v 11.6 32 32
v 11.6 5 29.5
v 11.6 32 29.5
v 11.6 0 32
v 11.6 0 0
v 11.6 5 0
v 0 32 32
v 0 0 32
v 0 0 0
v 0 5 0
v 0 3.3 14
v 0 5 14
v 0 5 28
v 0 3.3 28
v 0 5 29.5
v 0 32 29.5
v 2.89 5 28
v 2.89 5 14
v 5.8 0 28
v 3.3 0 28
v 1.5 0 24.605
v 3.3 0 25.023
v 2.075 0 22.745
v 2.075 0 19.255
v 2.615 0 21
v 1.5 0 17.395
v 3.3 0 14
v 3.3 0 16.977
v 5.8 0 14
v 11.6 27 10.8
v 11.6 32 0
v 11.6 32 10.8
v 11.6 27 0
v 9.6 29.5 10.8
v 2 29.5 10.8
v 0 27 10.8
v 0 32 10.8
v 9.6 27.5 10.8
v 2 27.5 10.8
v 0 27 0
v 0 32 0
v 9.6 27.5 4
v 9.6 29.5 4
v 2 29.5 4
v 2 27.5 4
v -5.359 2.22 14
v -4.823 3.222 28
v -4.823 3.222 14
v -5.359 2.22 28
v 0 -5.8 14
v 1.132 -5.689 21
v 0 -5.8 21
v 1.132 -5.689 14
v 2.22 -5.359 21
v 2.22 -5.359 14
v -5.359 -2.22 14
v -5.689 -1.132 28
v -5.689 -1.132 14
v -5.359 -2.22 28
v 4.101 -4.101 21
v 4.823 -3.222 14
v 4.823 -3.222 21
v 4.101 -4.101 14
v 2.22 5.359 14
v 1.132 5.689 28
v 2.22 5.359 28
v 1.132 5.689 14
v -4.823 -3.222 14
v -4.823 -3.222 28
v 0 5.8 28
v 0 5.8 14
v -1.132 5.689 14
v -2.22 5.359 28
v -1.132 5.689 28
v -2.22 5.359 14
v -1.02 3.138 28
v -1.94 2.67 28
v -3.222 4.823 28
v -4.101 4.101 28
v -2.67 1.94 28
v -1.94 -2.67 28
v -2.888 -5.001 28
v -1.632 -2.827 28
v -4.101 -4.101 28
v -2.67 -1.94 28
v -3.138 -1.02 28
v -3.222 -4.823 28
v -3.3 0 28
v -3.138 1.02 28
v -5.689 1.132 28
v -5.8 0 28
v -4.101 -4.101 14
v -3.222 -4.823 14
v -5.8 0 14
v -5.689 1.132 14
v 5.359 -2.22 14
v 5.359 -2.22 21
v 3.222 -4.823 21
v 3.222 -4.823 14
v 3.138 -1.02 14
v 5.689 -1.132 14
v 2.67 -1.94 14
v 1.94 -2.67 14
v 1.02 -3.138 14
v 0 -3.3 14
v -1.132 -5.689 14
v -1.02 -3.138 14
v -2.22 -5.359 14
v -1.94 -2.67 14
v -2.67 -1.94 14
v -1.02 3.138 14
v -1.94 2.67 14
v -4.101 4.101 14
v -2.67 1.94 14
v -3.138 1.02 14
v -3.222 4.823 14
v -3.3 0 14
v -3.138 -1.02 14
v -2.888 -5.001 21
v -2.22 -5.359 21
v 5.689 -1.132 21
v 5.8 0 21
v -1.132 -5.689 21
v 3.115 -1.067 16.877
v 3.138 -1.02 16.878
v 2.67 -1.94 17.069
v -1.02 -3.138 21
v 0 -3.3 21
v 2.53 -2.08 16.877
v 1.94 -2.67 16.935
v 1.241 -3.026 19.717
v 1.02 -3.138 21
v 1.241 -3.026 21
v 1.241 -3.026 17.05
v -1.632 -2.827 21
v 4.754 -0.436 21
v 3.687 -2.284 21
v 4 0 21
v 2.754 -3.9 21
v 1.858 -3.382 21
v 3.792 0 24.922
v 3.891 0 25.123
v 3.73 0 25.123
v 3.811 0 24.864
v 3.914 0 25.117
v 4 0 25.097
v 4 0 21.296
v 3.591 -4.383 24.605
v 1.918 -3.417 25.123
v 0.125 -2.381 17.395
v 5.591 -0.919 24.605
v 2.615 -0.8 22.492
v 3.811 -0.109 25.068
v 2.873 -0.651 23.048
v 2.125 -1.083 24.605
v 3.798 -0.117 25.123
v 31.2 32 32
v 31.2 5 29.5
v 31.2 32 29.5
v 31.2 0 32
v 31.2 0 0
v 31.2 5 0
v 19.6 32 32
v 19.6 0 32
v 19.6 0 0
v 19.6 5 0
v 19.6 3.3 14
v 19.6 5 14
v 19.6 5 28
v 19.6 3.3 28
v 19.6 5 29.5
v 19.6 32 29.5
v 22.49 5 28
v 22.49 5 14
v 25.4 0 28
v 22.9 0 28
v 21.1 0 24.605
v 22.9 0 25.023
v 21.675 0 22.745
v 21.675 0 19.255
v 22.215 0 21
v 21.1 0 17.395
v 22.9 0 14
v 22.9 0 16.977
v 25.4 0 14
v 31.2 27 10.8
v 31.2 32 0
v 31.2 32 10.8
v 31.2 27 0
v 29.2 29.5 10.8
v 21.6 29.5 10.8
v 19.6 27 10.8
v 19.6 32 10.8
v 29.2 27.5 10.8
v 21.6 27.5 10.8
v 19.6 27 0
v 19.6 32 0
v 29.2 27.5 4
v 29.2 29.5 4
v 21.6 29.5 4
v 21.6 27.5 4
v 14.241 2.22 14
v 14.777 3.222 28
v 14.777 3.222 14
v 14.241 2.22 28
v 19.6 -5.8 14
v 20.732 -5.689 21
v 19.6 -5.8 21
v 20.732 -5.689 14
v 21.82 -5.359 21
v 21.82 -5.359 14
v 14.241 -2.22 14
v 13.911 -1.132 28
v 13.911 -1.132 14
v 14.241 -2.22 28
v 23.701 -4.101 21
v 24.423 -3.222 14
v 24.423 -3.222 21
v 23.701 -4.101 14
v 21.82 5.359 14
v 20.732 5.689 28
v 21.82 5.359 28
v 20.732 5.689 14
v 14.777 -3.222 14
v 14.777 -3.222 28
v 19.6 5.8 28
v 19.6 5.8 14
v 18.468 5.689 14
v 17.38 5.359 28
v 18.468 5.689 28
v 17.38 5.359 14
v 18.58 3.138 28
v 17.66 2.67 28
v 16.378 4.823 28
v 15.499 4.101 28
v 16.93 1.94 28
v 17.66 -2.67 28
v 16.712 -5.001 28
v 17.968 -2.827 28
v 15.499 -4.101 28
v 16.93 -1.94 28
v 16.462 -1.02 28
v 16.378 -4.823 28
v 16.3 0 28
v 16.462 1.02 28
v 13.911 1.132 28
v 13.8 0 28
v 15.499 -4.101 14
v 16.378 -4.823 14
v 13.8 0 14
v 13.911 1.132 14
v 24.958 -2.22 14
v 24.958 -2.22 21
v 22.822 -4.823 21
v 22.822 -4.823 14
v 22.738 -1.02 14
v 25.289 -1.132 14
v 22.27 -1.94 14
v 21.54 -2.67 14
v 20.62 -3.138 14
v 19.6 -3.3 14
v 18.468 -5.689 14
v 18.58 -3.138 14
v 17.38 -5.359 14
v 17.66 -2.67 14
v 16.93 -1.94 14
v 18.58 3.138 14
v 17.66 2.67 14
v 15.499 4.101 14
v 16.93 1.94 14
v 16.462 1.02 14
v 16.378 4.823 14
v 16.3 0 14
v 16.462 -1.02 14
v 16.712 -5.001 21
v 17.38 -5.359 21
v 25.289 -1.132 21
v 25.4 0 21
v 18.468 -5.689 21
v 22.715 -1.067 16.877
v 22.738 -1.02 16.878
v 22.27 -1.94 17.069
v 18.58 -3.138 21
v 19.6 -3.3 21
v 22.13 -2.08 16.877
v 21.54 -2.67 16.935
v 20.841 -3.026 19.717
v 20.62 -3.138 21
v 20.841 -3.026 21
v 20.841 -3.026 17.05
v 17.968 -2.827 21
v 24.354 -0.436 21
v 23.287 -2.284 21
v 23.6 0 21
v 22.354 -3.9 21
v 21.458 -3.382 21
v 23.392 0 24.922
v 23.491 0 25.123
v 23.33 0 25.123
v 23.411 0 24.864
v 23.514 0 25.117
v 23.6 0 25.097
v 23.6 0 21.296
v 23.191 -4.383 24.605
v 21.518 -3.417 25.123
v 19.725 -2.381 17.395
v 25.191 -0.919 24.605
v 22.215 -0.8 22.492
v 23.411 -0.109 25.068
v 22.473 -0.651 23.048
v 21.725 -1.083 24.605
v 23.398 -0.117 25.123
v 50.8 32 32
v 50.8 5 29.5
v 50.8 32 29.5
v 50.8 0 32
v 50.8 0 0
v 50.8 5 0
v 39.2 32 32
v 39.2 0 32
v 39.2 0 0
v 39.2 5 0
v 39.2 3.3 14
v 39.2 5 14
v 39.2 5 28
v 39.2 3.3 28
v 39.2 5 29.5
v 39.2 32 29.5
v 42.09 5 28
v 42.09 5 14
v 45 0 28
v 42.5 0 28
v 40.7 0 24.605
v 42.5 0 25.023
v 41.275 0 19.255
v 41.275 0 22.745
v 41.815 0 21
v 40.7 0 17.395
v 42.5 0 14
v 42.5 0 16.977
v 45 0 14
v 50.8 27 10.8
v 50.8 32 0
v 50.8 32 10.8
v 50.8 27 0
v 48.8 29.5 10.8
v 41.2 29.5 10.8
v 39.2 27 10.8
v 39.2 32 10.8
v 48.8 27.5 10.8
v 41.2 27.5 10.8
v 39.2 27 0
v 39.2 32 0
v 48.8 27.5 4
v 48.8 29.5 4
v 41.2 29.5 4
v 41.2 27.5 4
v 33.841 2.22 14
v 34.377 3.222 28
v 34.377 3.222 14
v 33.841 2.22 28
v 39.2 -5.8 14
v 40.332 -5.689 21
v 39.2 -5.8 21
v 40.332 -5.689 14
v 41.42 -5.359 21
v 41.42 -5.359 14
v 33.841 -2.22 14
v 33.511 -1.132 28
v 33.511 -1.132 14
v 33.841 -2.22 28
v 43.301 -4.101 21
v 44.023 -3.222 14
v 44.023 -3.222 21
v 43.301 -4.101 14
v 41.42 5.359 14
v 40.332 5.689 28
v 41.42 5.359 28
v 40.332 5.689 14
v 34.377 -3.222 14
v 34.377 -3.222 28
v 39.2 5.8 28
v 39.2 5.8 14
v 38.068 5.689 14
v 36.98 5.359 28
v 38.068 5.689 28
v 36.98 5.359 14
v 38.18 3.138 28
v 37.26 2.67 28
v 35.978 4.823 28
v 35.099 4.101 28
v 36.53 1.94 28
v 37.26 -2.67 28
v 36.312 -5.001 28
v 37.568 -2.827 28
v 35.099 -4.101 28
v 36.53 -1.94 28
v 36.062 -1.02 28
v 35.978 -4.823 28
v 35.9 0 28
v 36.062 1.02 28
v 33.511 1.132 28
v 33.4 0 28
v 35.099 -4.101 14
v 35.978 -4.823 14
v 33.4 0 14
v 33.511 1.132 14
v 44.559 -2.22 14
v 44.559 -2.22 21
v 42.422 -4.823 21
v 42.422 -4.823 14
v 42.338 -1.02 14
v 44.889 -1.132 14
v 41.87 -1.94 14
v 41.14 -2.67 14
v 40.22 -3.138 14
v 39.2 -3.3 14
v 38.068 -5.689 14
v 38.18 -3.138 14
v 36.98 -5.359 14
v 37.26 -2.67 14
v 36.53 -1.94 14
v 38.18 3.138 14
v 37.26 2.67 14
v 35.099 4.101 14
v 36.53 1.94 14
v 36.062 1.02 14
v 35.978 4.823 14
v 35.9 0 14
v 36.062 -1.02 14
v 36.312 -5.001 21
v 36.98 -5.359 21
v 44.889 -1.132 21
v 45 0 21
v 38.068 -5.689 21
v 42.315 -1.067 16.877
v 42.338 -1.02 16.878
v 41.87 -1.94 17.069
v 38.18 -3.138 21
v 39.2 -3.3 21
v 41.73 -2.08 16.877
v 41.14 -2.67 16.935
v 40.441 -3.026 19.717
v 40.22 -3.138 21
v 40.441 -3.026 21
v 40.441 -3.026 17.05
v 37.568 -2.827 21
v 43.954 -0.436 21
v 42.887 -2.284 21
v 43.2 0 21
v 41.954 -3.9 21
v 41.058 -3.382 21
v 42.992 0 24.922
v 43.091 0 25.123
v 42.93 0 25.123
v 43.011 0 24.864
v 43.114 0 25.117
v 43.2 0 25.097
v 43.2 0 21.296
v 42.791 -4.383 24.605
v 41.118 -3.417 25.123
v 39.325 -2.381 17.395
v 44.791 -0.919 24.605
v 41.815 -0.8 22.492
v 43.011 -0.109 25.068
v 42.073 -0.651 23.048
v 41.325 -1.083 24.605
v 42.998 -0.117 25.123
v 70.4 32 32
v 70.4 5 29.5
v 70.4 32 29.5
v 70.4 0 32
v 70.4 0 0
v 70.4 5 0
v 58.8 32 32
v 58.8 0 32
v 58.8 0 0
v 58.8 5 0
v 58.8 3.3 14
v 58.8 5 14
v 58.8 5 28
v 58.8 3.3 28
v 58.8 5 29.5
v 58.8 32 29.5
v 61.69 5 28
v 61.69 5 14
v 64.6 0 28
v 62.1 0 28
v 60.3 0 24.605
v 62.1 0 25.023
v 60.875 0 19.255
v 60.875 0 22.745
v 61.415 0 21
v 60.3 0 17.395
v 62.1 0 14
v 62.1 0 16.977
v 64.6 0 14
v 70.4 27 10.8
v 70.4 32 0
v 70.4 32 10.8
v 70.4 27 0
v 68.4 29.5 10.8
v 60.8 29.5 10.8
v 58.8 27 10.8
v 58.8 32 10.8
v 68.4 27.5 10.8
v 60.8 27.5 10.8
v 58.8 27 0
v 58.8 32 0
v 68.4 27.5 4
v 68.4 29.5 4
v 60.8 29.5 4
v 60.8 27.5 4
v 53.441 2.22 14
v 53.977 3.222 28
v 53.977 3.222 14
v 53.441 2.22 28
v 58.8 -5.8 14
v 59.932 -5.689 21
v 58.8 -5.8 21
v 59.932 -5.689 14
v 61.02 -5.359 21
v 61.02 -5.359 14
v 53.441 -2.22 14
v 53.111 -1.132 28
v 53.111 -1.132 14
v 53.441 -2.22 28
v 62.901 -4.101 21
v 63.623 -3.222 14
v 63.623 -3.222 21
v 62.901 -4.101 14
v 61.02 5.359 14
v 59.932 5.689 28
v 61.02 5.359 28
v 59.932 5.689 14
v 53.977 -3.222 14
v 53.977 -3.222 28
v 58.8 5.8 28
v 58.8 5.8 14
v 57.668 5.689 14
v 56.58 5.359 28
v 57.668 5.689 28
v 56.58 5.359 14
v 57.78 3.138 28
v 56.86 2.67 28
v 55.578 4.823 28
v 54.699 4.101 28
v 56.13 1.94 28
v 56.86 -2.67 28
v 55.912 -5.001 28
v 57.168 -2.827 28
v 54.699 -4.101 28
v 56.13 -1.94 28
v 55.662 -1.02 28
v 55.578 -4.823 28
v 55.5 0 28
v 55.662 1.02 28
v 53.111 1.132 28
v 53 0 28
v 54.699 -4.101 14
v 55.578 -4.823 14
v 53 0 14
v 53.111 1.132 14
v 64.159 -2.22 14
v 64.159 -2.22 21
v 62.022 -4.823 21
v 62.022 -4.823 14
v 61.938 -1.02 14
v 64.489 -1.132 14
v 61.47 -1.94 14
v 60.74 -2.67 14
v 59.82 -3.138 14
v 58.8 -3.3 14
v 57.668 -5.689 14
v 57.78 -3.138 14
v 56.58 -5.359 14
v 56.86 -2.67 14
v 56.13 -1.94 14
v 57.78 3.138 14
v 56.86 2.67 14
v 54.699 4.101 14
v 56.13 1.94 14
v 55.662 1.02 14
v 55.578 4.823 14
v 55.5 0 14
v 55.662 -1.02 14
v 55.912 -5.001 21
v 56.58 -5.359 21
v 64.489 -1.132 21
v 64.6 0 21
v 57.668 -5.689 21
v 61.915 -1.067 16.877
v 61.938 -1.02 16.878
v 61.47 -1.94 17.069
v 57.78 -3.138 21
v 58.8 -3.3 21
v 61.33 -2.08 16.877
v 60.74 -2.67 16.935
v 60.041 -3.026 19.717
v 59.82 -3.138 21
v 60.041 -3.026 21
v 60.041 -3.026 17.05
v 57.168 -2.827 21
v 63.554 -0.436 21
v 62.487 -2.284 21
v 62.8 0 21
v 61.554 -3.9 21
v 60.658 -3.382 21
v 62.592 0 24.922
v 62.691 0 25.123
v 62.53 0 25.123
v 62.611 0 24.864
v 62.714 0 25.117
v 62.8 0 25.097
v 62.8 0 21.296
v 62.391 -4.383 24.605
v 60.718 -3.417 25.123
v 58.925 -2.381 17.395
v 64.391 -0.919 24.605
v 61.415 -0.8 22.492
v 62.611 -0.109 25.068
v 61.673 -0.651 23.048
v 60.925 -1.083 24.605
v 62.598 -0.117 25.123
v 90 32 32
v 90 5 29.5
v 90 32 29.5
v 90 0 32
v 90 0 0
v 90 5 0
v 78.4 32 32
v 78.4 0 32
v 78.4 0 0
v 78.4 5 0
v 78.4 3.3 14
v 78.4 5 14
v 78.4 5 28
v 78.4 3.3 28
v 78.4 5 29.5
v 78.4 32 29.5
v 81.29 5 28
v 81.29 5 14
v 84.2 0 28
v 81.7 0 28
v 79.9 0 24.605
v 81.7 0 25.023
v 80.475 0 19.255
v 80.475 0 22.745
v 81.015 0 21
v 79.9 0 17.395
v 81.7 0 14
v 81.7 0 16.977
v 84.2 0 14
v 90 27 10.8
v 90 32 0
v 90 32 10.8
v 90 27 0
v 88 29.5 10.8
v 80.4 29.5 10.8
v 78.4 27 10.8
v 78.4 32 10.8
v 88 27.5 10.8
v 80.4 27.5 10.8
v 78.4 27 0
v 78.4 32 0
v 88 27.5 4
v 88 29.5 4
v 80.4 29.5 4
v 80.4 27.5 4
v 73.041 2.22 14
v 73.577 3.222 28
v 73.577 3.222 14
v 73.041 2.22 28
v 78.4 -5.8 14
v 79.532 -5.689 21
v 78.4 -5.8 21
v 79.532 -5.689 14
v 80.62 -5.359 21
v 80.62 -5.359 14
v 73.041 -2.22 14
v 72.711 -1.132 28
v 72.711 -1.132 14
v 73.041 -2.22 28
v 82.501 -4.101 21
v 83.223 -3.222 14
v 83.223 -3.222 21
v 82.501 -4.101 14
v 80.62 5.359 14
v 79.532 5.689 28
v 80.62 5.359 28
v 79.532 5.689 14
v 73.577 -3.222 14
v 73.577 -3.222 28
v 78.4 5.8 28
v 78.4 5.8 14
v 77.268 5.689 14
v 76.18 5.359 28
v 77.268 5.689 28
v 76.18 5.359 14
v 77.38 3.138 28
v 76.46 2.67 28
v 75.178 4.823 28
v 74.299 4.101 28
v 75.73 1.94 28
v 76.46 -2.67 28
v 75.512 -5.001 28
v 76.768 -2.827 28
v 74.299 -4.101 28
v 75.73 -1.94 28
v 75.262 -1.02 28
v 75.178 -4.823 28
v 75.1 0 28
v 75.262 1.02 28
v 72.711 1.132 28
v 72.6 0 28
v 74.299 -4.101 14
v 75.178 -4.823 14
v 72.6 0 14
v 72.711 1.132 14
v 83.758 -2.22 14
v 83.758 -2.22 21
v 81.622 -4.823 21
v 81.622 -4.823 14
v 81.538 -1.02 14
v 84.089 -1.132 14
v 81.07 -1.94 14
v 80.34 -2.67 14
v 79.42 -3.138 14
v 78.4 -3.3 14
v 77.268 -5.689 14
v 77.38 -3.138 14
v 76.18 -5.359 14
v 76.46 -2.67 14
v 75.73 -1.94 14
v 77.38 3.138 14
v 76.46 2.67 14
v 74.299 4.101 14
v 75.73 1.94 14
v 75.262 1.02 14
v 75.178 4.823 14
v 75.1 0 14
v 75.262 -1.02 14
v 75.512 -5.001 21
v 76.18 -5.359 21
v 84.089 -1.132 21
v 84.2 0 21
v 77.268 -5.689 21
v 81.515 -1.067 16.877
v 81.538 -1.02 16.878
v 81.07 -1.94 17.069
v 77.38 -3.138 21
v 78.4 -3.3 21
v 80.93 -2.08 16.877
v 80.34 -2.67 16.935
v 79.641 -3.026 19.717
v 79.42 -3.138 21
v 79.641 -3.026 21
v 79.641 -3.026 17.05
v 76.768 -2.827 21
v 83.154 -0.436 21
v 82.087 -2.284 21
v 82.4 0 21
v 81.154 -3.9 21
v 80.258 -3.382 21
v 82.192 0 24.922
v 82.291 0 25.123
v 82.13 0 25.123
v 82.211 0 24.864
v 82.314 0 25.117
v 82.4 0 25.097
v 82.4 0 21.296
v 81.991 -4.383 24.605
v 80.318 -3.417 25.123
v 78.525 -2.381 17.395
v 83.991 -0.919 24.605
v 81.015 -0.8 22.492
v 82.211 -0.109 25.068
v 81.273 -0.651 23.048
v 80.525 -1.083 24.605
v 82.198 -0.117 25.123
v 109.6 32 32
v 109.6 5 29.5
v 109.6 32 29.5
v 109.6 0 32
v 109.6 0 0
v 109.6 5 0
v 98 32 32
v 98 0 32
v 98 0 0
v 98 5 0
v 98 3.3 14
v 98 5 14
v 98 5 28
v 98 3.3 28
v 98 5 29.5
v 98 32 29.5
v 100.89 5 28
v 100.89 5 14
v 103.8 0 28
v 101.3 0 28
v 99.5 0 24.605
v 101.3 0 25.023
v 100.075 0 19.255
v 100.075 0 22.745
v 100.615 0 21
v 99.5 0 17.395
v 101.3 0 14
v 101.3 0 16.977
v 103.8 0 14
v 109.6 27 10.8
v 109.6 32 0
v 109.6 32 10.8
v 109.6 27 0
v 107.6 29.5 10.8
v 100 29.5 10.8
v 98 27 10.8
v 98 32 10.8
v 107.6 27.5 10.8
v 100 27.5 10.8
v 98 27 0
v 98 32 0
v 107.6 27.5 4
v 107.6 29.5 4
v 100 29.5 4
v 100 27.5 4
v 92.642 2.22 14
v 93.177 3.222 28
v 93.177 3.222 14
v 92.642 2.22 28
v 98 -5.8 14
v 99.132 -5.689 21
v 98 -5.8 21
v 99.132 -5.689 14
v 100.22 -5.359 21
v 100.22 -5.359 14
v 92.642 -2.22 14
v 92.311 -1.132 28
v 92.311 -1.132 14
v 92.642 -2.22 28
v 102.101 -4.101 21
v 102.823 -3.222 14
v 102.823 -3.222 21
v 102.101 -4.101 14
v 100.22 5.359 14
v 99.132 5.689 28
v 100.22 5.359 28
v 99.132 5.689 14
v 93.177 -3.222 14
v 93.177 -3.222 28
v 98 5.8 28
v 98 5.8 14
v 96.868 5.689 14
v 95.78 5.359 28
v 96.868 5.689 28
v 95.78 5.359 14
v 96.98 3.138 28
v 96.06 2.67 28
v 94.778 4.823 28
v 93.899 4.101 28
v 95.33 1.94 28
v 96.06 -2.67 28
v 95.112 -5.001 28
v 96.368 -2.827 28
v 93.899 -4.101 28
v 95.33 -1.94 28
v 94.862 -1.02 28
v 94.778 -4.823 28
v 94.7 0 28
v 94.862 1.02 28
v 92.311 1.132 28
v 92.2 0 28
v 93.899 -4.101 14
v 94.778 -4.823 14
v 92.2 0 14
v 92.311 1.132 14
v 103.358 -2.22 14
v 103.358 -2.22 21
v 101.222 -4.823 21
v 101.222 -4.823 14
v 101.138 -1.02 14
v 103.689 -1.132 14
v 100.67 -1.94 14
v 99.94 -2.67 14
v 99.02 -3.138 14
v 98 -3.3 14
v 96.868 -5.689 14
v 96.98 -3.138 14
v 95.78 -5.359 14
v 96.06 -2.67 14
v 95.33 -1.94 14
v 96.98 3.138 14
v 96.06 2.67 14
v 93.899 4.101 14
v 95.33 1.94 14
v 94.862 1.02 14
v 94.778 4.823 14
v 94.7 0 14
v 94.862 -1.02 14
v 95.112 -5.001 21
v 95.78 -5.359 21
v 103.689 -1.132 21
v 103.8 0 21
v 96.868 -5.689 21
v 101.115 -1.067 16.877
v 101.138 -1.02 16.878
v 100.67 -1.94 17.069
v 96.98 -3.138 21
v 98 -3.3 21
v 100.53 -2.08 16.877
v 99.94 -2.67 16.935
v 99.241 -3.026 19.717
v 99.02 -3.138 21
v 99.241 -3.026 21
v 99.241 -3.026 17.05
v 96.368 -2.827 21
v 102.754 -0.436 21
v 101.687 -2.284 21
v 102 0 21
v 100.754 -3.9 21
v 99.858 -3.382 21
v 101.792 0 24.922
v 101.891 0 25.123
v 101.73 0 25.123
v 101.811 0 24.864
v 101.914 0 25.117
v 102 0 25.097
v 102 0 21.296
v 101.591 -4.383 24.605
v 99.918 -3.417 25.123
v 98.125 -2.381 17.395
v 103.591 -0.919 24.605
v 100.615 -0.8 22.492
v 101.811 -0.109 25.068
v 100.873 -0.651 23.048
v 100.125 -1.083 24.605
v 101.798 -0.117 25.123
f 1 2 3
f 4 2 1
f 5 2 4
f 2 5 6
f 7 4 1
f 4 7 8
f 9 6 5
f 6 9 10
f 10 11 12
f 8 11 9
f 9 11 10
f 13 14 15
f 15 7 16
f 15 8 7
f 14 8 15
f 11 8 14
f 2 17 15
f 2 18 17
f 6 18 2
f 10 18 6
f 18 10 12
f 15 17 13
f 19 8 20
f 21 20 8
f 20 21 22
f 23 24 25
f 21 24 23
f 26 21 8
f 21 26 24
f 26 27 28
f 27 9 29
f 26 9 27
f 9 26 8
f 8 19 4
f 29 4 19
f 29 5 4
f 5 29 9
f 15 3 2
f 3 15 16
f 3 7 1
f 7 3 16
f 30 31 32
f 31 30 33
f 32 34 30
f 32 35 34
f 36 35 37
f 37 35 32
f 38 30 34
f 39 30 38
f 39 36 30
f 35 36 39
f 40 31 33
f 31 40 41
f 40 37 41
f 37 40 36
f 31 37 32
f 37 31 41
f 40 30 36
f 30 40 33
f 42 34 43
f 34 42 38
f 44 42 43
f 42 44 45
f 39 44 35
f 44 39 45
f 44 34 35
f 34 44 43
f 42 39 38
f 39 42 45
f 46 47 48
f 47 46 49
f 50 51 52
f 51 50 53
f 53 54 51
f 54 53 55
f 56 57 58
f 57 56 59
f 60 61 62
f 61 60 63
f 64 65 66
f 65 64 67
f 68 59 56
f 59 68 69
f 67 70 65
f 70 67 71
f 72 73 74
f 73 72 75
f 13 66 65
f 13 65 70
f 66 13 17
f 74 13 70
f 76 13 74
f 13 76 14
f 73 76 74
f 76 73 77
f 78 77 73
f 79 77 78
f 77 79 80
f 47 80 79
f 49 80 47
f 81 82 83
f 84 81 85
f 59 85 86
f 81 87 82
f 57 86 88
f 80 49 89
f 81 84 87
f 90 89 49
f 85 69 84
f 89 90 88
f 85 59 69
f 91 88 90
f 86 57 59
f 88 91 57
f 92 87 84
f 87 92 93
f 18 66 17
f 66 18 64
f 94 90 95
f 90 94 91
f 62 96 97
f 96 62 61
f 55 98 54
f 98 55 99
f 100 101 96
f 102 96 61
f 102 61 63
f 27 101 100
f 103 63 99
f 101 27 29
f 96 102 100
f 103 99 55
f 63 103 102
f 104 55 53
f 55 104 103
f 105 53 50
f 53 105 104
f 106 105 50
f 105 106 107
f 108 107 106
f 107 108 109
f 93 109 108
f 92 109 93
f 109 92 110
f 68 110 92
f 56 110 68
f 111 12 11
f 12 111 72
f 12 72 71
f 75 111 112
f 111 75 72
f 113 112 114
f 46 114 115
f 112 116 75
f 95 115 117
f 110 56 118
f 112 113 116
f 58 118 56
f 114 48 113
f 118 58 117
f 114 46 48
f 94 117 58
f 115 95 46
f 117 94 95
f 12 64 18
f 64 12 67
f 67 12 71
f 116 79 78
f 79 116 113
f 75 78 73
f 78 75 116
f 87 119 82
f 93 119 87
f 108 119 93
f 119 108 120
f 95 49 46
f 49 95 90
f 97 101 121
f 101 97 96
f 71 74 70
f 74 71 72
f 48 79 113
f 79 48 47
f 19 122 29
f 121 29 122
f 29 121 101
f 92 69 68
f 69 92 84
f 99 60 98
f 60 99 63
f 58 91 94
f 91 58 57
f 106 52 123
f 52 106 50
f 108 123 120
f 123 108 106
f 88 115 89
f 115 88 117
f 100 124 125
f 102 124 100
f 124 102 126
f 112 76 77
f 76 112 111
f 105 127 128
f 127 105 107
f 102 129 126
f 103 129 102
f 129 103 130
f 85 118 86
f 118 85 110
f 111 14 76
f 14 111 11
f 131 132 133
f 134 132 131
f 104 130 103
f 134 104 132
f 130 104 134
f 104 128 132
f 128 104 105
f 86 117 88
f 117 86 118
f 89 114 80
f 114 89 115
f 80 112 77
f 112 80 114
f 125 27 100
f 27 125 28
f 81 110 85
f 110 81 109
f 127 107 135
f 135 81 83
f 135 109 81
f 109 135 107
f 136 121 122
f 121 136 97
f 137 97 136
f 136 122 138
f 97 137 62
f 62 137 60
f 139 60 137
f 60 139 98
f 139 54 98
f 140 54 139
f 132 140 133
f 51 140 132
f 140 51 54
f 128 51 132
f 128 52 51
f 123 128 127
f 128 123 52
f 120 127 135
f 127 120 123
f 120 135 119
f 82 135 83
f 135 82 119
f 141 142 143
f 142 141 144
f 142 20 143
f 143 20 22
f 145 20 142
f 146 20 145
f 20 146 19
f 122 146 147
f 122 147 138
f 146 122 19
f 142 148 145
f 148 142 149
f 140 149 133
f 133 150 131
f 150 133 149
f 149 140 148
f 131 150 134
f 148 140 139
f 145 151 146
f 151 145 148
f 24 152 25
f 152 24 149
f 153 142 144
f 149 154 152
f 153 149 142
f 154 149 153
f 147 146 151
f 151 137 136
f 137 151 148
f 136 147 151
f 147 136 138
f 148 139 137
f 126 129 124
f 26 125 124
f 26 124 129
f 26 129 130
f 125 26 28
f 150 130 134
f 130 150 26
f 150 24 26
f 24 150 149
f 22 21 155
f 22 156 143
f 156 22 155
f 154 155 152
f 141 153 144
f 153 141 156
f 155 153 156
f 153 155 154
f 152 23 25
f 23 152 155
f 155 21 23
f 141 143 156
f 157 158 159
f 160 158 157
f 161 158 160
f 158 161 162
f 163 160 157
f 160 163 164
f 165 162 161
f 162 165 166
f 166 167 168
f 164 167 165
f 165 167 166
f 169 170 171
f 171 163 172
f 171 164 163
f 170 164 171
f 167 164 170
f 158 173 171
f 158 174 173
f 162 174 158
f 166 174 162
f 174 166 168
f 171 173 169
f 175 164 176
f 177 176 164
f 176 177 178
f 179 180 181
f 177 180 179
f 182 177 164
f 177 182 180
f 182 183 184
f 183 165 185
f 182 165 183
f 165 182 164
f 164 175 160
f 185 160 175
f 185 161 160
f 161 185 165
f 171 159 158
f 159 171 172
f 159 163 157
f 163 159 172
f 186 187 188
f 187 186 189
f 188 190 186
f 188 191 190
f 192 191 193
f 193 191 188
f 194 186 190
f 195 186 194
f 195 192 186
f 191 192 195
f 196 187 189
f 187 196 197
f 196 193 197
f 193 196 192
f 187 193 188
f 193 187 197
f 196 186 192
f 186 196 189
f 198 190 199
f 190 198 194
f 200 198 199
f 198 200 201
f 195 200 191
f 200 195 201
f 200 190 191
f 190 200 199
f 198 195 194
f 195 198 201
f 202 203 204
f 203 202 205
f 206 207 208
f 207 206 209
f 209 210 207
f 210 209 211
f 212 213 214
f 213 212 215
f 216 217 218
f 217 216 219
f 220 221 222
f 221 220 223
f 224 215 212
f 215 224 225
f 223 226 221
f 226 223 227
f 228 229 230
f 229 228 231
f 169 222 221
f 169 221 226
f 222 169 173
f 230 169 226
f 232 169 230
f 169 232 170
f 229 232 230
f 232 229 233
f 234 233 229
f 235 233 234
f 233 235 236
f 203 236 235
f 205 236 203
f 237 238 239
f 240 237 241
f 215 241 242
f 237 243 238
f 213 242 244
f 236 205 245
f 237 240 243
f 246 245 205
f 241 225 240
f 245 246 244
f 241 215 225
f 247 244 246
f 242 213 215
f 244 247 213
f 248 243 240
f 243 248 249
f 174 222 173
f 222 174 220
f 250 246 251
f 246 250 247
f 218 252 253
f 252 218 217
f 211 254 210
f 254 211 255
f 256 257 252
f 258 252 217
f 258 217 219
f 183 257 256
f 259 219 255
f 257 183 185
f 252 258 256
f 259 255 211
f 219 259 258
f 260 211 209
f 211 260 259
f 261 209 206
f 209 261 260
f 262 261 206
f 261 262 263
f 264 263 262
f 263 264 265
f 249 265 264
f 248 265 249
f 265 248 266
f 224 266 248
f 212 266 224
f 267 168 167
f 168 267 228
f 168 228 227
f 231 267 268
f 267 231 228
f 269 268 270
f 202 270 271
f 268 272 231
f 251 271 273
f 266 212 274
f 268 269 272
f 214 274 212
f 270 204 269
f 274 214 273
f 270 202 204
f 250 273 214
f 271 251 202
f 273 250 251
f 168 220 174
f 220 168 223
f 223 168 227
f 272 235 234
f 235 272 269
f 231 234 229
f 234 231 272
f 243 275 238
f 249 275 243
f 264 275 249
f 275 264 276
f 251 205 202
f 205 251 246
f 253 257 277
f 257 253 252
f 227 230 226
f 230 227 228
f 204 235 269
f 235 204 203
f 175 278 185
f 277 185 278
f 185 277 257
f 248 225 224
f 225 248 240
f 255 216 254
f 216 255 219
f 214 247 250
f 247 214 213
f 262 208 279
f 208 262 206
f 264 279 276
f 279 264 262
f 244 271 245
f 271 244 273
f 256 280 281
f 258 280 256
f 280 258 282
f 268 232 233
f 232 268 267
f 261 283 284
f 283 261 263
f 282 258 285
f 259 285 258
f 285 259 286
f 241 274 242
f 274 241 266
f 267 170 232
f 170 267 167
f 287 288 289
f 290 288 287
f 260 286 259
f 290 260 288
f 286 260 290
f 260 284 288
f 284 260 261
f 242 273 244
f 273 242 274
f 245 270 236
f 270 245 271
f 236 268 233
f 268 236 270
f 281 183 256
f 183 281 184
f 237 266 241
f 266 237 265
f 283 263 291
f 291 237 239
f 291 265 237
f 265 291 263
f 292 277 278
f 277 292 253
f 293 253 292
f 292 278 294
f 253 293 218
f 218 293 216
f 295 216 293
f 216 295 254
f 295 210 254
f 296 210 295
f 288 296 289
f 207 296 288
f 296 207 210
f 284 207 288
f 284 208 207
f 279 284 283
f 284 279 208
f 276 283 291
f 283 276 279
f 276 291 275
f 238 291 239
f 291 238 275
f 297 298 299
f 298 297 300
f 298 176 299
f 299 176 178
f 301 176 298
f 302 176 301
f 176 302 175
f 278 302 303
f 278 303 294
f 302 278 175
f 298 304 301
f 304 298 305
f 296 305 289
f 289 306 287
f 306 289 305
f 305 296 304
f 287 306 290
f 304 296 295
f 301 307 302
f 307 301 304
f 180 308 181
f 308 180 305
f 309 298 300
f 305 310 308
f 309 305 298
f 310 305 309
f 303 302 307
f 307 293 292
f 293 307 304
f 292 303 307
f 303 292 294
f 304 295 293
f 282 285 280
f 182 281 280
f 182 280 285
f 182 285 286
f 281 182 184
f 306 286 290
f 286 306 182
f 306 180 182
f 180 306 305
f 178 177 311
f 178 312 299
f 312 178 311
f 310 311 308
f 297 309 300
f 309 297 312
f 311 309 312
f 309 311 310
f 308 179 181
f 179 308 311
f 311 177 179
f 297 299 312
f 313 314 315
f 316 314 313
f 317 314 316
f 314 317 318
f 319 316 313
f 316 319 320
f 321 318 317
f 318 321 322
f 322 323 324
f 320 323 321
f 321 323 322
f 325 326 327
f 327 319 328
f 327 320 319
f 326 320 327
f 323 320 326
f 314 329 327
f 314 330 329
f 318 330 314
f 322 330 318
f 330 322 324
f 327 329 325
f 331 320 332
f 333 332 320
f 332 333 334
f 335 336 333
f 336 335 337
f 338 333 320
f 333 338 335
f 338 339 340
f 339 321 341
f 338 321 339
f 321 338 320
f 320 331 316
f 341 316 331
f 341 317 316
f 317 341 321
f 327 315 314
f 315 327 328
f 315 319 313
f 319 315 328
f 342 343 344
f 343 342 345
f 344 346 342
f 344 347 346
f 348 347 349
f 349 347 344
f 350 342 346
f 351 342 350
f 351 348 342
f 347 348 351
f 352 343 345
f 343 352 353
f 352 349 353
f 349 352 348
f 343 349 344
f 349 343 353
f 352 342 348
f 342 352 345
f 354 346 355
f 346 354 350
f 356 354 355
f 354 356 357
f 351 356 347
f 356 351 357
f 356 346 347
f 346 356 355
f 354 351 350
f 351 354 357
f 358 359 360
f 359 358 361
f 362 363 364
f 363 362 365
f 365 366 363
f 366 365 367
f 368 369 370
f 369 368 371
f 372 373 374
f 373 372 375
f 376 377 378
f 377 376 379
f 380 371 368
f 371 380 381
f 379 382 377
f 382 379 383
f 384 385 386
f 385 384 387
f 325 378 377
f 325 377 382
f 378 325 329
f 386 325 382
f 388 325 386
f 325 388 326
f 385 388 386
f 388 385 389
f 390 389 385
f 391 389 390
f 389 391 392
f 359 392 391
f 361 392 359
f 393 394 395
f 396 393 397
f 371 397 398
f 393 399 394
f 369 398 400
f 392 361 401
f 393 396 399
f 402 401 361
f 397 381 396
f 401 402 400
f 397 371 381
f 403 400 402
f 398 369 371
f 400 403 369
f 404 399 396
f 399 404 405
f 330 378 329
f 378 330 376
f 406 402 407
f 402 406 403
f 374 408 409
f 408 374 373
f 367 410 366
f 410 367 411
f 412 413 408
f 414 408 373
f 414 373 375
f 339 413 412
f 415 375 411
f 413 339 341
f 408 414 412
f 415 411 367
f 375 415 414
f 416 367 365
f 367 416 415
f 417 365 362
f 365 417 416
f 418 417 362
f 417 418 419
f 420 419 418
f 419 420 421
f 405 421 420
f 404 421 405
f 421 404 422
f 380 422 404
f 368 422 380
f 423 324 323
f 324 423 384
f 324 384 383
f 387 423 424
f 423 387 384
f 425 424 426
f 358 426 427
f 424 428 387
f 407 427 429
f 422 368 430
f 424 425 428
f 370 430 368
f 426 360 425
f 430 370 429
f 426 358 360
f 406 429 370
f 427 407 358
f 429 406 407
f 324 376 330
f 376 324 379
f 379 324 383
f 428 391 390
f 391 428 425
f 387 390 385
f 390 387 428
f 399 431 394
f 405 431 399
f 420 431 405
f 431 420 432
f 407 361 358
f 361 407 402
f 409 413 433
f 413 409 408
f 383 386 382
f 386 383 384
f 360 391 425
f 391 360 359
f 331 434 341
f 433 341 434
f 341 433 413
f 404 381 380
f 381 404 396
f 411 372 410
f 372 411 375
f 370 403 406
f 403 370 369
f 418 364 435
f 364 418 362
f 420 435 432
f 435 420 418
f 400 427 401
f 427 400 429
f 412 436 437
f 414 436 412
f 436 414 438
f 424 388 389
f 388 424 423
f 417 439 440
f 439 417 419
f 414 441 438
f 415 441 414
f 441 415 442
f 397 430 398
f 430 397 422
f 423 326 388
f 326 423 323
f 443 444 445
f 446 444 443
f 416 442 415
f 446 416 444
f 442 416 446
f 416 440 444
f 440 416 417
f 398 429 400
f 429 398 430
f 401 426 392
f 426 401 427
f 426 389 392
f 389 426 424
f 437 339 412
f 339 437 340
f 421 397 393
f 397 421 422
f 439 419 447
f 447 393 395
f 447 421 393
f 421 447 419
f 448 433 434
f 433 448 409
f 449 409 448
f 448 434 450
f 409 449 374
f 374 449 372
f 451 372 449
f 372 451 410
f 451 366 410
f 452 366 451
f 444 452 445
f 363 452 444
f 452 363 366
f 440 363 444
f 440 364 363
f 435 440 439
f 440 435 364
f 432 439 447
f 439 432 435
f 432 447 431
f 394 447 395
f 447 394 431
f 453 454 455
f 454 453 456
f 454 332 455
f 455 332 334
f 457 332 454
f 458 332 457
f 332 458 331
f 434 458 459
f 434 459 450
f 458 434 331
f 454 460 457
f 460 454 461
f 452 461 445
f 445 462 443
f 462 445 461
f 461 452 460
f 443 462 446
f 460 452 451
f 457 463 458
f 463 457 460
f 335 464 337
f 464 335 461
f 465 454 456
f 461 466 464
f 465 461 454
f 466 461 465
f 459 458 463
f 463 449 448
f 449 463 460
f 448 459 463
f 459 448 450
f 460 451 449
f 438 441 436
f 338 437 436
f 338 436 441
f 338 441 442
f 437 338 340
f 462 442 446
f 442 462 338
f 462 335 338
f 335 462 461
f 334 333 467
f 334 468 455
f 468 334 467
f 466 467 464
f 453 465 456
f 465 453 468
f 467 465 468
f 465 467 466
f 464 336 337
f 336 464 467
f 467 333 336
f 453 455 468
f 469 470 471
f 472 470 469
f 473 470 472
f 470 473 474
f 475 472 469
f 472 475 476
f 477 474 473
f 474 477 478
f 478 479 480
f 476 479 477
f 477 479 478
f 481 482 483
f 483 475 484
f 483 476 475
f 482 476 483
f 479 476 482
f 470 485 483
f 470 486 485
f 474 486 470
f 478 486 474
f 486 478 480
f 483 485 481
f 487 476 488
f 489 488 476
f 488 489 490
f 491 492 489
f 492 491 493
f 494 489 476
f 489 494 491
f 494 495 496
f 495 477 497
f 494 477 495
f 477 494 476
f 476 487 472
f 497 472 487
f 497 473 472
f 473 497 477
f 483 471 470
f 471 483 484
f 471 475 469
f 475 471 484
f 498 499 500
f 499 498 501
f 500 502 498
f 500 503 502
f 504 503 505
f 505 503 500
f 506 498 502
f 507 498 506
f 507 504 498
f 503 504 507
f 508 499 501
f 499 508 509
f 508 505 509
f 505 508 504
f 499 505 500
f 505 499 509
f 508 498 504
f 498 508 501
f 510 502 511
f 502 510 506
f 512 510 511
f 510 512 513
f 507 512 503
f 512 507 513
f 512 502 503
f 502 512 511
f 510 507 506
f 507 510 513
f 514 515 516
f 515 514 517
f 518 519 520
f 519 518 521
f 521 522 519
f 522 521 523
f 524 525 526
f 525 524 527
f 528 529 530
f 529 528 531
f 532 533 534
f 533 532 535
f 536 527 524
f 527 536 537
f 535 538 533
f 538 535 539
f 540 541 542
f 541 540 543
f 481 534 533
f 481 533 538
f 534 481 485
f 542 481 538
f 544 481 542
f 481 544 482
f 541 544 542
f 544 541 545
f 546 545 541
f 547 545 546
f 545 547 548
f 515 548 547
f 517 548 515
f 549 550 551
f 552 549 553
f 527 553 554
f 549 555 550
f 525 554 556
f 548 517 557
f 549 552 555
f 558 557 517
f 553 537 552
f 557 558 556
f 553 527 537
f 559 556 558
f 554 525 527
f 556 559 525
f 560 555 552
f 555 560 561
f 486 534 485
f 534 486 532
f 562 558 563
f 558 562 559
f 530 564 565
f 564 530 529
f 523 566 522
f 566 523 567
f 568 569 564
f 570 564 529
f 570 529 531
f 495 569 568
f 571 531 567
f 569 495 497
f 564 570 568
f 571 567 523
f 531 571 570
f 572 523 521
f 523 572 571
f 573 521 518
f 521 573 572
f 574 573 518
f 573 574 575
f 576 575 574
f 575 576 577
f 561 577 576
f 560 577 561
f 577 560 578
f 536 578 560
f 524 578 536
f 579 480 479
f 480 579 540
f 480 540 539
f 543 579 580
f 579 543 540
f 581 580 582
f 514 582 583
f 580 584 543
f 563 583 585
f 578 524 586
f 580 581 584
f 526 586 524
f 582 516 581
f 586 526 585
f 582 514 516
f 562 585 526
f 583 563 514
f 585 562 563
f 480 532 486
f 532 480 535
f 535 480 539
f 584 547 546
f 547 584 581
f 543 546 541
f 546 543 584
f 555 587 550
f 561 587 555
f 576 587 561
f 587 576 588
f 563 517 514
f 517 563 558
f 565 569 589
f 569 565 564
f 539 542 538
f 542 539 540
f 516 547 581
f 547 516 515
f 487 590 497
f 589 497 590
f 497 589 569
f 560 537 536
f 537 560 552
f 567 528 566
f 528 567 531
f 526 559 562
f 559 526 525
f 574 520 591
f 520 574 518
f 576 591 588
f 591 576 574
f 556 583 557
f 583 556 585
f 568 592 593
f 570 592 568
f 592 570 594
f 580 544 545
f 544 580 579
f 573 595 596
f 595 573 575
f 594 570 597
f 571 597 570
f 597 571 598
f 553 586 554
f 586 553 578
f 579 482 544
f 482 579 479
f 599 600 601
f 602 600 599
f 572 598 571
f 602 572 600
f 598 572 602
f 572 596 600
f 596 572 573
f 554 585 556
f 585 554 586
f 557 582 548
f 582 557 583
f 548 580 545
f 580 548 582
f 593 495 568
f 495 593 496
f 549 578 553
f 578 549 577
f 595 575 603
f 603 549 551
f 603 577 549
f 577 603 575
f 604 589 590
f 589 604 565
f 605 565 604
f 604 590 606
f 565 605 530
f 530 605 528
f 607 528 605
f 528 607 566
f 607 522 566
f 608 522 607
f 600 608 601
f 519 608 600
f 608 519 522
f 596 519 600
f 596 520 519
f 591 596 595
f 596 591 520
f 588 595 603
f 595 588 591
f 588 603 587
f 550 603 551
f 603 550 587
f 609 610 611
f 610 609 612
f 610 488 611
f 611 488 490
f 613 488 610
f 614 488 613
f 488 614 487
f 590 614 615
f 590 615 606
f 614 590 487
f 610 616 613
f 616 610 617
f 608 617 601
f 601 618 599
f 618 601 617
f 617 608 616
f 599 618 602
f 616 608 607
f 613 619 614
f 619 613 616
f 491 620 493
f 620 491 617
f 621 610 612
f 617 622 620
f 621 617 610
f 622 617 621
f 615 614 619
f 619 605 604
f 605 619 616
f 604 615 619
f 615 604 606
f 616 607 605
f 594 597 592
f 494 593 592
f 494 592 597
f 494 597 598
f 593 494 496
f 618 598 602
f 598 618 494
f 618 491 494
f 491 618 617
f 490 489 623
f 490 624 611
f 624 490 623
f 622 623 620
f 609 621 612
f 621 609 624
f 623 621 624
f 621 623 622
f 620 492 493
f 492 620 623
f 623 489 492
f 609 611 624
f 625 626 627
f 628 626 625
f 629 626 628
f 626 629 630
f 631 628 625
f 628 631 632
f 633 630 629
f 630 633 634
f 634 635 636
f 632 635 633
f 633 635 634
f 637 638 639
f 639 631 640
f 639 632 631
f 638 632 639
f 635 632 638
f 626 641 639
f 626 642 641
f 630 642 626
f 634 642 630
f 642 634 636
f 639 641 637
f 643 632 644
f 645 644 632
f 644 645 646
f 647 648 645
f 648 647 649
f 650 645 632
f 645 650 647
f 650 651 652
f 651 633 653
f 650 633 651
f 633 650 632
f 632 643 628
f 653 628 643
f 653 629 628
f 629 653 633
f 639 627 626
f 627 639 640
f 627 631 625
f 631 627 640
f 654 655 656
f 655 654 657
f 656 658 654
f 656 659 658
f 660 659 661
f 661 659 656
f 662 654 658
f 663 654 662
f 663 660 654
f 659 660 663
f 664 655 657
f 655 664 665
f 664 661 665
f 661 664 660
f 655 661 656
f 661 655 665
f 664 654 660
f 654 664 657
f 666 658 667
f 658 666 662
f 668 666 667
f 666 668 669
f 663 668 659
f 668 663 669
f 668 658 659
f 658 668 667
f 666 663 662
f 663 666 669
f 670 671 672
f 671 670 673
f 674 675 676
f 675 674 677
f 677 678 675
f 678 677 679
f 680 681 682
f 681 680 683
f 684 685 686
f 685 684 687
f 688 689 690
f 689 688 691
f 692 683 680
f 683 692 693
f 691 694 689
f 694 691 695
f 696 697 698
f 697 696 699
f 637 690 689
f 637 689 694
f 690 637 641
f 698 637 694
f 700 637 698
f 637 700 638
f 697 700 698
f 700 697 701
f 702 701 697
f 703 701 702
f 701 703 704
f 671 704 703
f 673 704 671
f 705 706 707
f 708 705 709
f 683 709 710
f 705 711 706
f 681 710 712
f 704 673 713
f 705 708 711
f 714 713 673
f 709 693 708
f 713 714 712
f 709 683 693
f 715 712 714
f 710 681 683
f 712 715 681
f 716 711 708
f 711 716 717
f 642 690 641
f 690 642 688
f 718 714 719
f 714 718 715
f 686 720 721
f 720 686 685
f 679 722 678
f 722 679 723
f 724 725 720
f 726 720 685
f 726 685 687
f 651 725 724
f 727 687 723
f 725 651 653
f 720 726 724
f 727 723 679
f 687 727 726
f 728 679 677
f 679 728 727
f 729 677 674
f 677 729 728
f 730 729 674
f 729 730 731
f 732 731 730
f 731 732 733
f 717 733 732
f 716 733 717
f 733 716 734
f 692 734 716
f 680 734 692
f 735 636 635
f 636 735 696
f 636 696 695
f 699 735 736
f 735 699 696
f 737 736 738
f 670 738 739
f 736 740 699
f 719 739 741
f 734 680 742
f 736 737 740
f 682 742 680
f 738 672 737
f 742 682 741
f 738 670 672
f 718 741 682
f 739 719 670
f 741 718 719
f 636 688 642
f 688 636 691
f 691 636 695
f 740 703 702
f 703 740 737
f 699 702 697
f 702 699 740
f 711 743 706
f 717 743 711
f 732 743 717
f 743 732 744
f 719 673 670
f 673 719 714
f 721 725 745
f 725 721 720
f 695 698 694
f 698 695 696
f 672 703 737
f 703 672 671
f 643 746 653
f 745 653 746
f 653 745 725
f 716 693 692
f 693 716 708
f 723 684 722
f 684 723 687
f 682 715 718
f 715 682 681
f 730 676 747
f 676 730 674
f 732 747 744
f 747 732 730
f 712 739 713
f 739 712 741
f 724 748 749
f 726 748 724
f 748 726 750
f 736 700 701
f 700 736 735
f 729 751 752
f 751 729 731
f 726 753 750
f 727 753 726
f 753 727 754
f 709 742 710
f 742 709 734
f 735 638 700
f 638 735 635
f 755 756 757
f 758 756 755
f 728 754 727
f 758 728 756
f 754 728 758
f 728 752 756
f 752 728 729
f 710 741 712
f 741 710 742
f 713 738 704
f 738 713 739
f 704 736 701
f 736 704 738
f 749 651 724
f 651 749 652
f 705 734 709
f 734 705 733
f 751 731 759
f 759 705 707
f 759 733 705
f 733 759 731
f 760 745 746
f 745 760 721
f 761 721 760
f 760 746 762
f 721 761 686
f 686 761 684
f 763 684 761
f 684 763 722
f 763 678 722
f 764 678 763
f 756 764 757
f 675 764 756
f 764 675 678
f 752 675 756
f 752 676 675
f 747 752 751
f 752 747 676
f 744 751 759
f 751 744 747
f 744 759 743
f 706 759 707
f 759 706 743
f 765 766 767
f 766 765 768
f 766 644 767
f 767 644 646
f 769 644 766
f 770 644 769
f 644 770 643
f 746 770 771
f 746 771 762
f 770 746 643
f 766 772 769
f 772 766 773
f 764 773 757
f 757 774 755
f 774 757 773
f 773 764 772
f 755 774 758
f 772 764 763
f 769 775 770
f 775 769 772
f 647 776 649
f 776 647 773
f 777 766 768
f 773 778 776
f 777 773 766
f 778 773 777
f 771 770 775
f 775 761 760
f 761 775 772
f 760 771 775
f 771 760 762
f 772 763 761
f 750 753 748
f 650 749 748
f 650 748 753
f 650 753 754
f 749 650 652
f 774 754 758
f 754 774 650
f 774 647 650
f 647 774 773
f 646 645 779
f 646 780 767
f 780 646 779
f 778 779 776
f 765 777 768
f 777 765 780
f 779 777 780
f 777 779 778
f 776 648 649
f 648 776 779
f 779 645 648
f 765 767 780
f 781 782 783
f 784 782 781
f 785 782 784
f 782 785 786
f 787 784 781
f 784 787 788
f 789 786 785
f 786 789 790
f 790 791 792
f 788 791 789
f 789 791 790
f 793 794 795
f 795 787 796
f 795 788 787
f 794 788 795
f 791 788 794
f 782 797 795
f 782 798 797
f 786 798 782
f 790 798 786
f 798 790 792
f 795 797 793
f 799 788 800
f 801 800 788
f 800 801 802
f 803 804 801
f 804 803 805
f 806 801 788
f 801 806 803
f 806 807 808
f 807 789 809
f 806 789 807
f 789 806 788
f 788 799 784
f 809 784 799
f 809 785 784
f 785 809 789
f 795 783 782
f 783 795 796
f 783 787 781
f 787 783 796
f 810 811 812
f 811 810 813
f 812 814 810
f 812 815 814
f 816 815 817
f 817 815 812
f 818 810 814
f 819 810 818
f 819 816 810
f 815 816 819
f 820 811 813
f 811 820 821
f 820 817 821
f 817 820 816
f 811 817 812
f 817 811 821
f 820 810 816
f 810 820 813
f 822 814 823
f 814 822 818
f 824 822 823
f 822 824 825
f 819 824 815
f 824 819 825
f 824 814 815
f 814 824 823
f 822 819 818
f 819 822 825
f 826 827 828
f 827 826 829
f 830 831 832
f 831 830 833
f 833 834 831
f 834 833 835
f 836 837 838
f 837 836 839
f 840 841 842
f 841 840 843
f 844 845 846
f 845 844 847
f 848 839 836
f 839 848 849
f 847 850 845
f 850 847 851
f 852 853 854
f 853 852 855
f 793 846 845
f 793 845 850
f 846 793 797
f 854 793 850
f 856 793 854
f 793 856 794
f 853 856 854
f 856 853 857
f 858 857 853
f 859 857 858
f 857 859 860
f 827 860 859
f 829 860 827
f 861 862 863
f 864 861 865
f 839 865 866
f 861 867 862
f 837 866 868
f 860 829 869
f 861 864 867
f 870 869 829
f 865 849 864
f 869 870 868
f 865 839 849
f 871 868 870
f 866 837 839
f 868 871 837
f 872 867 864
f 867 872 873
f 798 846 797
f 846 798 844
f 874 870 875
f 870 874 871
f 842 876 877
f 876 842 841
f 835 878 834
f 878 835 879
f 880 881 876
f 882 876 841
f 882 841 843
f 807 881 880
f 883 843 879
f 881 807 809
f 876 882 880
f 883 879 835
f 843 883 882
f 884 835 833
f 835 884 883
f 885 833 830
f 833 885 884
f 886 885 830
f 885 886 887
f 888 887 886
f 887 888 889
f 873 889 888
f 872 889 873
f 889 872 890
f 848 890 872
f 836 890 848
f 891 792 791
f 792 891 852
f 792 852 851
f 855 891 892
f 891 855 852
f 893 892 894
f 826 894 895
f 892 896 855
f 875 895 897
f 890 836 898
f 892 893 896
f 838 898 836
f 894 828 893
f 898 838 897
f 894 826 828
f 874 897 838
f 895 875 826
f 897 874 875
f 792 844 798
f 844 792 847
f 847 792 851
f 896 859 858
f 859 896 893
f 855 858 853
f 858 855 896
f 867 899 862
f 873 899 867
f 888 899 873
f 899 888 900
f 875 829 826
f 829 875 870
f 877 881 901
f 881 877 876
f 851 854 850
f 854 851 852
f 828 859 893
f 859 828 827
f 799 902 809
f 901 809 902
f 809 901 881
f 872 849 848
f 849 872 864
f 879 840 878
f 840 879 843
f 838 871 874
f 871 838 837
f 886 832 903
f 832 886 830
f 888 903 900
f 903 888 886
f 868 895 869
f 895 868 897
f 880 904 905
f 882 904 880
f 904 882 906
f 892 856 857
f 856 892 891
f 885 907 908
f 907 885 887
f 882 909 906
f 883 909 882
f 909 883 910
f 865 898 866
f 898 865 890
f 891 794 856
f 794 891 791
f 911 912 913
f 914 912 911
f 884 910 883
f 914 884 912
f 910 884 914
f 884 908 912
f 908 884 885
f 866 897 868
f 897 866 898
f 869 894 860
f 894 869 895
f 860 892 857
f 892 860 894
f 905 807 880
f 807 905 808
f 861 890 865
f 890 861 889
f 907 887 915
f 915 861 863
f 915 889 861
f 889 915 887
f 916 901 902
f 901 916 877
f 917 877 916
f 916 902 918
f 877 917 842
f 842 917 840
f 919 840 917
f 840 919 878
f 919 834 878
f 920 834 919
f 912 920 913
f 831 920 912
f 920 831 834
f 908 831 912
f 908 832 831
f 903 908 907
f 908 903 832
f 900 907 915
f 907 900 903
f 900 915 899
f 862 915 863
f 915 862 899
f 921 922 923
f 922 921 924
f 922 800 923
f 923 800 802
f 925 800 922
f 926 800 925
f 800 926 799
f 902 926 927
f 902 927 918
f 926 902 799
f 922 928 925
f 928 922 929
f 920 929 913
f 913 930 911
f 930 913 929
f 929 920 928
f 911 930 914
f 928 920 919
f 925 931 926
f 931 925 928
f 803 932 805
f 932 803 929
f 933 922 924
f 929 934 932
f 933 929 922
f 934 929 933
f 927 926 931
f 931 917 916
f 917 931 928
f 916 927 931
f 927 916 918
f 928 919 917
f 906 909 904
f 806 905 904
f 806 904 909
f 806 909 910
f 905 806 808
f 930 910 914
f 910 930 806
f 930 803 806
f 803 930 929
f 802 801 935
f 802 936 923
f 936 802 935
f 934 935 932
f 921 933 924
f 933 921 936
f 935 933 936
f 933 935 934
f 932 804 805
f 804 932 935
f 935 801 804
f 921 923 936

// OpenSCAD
// Cable Clip Set - Desk / Monitor Edge Mount
// PETG — flexible enough to snap on, strong enough to hold
// 0.2mm, 4 walls, 25% infill
// Prints 6 clips per plate — sell as sets

CLIP_TYPE  = "edge";  // "edge" = monitor/desk rim, "flat" = adhesive base

// Cable specs
CABLE_D    = 6;    // Cable diameter (USB-C ≈ 4mm, HDMI ≈ 10mm)
CLIP_PLAY  = 0.6;  // Snap-fit opening extra — PLA needs 0.8, PETG 0.5

// Edge-mount specs
EDGE_T     = 22;   // Desk/monitor edge thickness
EDGE_DEPTH = 18;
WALL_T     = 2.5;

module cable_channel() {
    cylinder(d = CABLE_D + CLIP_PLAY, h = 100, center = true, $fn = 20);
}

module snap_clip_body() {
    union() {
        // Cable cradle
        difference() {
            cylinder(d = CABLE_D + WALL_T*2 + CLIP_PLAY, h = 14, $fn = 32);
            cable_channel();
            // Snap opening (top 120°)
            translate([0, 0, 7])
                rotate([0, 0, -60])
                    linear_extrude(14)
                        polygon([[0,0],
                                 [(CABLE_D+WALL_T*3)*cos(-60), (CABLE_D+WALL_T*3)*sin(-60)],
                                 [(CABLE_D+WALL_T*3)*cos(60),  (CABLE_D+WALL_T*3)*sin(60)]]);
        }
        // Snap fingers
        for (s = [-1, 1])
            rotate([0, 0, s * 30])
                translate([CABLE_D/2 + CLIP_PLAY/2, 0, 7])
                    rotate([0, -15*s, 0])
                        cube([WALL_T * 0.8, 4, 8], center = true);
    }
}

module edge_mount_arm() {
    // Wraps over desk/monitor edge
    difference() {
        union() {
            // Front arm
            cube([CABLE_D + WALL_T*2 + CLIP_PLAY, WALL_T*2, EDGE_DEPTH + 14]);
            // Top bridge
            translate([0, 0, EDGE_DEPTH + 14 - WALL_T])
                cube([CABLE_D + WALL_T*2 + CLIP_PLAY, EDGE_T + WALL_T*4, WALL_T]);
            // Back arm
            translate([0, EDGE_T + WALL_T*2, 0])
                cube([CABLE_D + WALL_T*2 + CLIP_PLAY, WALL_T*2, EDGE_DEPTH * 0.6]);
        }
        // Grip pad slots (for foam tape)
        translate([2, EDGE_T + WALL_T*2 + 0.5, 4])
            cube([CABLE_D + WALL_T*2 + CLIP_PLAY - 4, 2, EDGE_DEPTH * 0.5]);
    }
}

module flat_adhesive_base() {
    cube([CABLE_D + WALL_T*2 + CLIP_PLAY, 28, WALL_T * 1.5]);
}

// Build plate — 6 clips in a row
for (i = [0 : 5]) {
    translate([i * (CABLE_D + WALL_T*2 + CLIP_PLAY + 8), 0, 0]) {
        if (CLIP_TYPE == "edge") {
            edge_mount_arm();
            translate([0, 0, 14]) snap_clip_body();
        } else {
            flat_adhesive_base();
            translate([0, 14, WALL_T * 1.5]) snap_clip_body();
        }
    }
}
